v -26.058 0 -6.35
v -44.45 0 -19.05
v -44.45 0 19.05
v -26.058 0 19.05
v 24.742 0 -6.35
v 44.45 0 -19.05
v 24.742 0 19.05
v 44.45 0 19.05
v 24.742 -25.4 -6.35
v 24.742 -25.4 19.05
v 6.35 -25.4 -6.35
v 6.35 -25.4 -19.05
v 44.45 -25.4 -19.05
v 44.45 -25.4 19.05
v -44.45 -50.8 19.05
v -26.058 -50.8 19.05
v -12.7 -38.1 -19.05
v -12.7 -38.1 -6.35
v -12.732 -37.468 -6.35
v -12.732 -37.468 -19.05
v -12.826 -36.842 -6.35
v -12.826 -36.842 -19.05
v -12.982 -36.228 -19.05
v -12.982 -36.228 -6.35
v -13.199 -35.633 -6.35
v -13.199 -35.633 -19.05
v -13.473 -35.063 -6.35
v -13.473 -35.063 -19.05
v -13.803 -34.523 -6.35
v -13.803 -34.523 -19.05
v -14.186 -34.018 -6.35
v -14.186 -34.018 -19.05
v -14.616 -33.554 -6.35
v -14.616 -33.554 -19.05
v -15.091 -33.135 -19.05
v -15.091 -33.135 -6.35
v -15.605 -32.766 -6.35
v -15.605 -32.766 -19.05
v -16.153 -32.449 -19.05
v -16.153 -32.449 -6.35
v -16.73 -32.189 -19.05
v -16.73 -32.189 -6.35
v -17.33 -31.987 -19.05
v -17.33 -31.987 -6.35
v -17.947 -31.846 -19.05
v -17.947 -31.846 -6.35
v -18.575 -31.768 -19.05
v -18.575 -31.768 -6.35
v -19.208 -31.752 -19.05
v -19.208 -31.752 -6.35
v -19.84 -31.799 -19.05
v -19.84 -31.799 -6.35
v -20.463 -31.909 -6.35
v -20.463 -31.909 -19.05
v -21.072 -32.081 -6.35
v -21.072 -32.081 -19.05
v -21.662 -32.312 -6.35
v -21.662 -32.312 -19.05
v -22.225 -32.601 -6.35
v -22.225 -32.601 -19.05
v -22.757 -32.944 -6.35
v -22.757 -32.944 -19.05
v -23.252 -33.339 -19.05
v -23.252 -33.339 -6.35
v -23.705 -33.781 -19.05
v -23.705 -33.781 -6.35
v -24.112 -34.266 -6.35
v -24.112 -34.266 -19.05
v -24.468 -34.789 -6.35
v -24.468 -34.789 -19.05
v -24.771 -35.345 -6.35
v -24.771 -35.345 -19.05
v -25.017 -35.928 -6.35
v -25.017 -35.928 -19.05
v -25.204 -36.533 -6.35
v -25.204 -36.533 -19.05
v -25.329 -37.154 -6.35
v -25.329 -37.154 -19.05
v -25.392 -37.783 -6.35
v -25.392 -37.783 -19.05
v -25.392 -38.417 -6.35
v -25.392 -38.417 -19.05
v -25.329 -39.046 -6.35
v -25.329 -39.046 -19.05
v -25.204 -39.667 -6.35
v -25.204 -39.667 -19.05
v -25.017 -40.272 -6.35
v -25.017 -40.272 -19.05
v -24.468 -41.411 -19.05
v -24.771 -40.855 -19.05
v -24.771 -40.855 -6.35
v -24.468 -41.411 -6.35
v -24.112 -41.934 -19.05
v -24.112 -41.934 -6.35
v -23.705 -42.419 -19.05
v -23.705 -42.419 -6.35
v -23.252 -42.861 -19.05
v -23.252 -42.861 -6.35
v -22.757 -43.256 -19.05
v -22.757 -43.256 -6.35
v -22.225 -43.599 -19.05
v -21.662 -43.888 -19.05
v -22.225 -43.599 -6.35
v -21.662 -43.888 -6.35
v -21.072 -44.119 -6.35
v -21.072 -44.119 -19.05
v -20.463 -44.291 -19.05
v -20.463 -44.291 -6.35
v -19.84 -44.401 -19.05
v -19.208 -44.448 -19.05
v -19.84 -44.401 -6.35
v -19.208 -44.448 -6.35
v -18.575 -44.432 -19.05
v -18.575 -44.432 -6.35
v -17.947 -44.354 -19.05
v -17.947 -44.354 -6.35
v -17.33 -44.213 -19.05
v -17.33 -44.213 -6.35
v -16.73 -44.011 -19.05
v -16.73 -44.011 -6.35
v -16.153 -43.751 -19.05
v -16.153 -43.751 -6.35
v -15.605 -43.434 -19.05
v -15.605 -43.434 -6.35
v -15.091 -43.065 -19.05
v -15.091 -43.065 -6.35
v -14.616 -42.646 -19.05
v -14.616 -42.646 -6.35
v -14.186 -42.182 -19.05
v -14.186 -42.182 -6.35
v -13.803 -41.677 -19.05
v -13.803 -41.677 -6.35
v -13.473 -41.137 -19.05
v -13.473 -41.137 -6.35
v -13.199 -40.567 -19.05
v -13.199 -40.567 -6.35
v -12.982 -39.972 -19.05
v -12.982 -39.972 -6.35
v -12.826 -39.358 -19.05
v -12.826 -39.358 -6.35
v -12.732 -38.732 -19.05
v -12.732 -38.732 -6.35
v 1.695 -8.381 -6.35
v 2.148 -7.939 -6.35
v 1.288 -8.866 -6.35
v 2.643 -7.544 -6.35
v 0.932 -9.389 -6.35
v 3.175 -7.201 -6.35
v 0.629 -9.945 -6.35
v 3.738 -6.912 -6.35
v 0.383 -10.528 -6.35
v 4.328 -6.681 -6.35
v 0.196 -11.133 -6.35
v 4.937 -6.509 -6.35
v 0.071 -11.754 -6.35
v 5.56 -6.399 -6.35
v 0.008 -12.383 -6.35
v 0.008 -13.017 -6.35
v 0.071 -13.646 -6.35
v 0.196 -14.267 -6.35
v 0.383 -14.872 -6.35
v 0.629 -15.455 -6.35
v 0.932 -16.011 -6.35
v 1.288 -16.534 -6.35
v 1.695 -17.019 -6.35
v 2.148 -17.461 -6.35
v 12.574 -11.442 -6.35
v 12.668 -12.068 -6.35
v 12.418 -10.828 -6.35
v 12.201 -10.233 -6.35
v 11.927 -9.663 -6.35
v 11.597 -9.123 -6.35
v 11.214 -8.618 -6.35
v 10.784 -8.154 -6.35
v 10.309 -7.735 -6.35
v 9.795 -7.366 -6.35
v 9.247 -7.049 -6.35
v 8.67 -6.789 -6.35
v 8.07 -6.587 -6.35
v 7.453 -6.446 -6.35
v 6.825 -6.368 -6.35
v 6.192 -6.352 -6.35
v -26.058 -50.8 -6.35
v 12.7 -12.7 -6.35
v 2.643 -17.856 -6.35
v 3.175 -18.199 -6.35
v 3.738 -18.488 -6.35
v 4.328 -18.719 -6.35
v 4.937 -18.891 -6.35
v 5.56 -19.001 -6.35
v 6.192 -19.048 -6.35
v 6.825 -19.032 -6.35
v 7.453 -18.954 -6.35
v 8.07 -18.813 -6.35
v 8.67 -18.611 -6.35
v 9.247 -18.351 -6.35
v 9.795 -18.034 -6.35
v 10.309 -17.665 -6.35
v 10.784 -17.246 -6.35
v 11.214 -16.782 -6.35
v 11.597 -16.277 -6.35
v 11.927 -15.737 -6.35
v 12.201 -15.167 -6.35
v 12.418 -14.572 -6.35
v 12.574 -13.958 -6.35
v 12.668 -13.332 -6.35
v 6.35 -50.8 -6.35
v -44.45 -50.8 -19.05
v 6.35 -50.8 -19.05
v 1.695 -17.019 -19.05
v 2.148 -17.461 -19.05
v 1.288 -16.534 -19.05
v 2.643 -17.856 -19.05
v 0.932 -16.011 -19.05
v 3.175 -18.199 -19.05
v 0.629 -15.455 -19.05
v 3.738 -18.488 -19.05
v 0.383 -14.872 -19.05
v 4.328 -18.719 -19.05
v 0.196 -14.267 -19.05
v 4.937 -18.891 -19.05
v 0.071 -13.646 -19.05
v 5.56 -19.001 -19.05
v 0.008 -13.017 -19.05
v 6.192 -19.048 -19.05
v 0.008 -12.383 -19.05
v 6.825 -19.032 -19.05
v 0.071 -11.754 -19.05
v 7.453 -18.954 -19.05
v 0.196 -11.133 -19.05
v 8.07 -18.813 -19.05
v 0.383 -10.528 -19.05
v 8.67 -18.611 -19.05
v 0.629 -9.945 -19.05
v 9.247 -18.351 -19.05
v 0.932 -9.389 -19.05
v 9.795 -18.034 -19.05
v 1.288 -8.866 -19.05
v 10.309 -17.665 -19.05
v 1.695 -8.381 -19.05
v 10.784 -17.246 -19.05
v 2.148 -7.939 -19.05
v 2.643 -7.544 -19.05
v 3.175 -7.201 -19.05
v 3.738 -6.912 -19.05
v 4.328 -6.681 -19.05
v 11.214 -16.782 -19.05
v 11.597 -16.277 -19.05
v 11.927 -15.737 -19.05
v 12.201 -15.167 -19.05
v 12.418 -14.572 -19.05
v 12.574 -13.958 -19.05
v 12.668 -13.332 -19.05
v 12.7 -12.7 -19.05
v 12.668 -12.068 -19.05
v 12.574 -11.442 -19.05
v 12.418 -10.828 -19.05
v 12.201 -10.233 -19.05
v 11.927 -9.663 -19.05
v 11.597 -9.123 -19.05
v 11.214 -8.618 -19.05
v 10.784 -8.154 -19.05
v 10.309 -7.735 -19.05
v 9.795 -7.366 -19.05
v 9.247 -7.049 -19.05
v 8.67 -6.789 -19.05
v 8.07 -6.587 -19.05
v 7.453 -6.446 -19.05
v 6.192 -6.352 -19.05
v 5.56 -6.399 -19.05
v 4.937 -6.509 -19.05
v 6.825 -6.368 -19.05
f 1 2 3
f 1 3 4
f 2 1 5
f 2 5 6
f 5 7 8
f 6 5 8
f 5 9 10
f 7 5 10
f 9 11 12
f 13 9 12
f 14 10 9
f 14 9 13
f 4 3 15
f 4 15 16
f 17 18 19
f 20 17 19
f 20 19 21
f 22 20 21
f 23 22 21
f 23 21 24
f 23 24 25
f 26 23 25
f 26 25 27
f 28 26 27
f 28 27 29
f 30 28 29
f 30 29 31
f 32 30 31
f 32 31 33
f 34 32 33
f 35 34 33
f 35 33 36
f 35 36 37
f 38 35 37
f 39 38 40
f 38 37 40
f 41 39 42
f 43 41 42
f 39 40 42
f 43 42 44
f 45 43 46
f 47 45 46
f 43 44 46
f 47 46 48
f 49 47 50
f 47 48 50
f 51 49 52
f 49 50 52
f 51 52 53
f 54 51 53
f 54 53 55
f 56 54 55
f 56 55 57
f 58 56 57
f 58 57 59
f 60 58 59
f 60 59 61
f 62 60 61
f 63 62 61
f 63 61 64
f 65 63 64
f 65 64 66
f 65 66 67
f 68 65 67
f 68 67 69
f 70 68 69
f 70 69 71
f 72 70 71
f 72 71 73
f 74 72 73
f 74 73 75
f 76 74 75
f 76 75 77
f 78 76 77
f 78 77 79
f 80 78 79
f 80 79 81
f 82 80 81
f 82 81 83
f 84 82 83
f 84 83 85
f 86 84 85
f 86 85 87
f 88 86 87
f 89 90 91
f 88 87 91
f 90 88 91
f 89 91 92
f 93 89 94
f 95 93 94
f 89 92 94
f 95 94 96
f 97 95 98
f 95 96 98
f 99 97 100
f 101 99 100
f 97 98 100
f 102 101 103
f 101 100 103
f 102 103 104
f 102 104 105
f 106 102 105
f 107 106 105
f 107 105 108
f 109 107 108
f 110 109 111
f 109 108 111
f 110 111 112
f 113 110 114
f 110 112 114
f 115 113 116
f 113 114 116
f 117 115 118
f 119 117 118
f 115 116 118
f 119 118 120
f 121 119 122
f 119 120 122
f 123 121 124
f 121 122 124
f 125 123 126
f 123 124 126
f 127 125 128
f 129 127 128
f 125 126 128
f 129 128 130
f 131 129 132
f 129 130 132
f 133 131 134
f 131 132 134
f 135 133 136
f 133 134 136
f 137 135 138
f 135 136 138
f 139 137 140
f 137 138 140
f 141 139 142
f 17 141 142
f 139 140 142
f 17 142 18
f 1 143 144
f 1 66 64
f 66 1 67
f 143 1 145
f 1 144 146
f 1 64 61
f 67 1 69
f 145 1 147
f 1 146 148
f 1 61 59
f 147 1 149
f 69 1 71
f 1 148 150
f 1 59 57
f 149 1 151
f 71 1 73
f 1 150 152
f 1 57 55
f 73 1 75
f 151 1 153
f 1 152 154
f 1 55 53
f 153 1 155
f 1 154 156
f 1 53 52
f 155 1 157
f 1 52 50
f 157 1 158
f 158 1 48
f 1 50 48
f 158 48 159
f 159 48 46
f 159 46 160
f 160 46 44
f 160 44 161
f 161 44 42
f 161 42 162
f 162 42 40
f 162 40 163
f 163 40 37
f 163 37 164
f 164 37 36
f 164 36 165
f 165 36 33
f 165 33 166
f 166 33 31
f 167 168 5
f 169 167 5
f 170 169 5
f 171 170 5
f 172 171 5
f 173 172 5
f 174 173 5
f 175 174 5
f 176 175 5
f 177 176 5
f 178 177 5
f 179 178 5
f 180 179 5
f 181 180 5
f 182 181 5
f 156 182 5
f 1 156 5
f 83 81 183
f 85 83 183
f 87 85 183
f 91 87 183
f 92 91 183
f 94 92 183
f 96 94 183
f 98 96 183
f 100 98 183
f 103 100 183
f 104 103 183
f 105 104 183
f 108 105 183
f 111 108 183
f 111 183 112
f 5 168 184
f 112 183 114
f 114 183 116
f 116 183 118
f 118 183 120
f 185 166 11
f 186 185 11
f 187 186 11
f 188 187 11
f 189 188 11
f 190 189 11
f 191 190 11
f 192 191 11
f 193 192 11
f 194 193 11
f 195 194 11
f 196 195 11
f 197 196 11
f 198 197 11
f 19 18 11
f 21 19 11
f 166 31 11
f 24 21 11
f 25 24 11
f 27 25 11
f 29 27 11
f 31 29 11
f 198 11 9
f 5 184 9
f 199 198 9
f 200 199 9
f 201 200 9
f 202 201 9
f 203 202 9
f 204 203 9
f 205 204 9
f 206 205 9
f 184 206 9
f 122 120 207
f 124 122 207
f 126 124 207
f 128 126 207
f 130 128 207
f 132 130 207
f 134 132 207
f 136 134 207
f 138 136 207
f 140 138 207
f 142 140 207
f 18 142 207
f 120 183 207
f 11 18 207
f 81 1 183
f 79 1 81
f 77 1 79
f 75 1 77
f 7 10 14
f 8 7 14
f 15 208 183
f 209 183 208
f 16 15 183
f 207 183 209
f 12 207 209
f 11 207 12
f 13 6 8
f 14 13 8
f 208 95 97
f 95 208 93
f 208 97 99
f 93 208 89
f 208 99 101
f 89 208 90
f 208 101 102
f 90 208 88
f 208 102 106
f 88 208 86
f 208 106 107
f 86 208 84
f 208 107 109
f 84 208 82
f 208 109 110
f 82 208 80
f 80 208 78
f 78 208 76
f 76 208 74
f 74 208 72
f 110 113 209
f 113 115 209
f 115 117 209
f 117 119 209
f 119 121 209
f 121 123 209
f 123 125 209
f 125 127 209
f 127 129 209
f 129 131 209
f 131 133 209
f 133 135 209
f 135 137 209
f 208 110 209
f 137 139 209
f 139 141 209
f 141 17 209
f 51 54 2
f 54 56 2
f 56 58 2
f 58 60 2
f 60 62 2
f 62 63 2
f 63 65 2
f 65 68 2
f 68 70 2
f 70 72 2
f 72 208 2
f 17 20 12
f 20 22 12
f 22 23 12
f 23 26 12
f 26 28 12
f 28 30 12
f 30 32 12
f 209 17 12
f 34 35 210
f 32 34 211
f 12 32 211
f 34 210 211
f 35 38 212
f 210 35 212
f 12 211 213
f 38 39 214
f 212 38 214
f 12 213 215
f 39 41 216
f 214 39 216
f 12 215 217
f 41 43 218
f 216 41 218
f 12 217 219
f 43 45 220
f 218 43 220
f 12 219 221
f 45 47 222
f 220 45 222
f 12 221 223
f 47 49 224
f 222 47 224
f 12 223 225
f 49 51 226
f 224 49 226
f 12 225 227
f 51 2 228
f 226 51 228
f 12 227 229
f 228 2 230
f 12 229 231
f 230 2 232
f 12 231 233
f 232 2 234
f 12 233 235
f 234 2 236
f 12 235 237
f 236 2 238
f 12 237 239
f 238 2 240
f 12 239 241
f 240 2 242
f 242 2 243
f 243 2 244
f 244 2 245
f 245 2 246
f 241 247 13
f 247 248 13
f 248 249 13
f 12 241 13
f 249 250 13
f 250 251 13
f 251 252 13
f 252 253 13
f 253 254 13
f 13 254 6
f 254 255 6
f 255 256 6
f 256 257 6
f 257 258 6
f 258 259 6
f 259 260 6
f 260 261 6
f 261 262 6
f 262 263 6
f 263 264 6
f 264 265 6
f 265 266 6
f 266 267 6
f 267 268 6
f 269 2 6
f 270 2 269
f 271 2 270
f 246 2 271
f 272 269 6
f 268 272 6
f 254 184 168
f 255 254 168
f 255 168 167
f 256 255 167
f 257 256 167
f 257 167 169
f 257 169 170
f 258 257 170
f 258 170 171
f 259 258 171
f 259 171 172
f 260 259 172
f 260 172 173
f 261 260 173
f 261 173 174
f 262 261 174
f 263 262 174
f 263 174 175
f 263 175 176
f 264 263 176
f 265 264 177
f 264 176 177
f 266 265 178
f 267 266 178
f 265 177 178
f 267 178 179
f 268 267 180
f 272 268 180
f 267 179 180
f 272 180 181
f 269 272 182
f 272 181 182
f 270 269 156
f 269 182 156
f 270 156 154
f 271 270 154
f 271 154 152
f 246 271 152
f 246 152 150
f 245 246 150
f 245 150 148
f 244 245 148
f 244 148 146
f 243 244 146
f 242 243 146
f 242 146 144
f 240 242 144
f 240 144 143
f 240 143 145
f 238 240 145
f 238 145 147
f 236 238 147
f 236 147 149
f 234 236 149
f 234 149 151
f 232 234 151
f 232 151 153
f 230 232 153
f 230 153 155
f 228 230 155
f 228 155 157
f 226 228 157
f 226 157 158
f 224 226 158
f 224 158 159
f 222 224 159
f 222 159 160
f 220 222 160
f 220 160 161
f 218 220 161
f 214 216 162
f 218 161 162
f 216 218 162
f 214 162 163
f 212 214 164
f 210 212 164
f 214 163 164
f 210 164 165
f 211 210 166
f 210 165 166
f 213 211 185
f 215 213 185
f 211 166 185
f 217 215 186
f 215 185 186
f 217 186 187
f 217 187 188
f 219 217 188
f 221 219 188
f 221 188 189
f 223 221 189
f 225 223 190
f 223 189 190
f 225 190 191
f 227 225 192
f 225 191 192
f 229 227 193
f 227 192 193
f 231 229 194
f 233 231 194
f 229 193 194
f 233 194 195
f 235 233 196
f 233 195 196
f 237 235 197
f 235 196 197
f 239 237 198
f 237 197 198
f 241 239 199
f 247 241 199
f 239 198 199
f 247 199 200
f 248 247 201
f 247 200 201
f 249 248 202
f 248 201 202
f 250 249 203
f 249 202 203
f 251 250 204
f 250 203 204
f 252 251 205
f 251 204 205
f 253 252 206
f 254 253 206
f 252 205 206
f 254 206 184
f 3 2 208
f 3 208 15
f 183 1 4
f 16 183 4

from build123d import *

# Parameters (mm, degrees)
F0_W     = 88.9
F0_H     = 38.1
F1_DEPTH = 50.8
F2_W     = 50.8
F2_H     = 25.4
F3_DEPTH = 50.801
F4_W     = 38.1
F4_H     = 25.4
F5_DEPTH = 38.101
F6_R     = 6.35
F7_DEPTH = 12.701


with BuildPart() as f1:
    # F0 (on Front) → F1 (new body)
    with BuildSketch(Plane.XZ):
        Rectangle(F0_W, F0_H)
    extrude(amount=F1_DEPTH)

    # F2 (on face) → F3 (cut, through all)
    with BuildSketch(Plane.XZ.offset(50.8)):
        with Locations((-0.658147, 6.35)):
            Rectangle(F2_W, F2_H)
    extrude(amount=-F3_DEPTH, mode=Mode.SUBTRACT)

    # F4 (on face) → F5 (cut, through all)
    with BuildSketch(Plane.XY.offset(19.05)):
        with Locations((25.4, -38.1)):
            Rectangle(F4_W, F4_H)
    extrude(amount=-F5_DEPTH, mode=Mode.SUBTRACT)

    # F6 (on face) → F7 (cut, through all)
    with BuildSketch(Plane.XY.offset(-6.35)):
        with Locations((6.35, -12.7)):
            Circle(F6_R)
        with Locations((-19.05, -38.1)):
            Circle(F6_R)
    extrude(amount=-F7_DEPTH, mode=Mode.SUBTRACT)


solid = f1.part
